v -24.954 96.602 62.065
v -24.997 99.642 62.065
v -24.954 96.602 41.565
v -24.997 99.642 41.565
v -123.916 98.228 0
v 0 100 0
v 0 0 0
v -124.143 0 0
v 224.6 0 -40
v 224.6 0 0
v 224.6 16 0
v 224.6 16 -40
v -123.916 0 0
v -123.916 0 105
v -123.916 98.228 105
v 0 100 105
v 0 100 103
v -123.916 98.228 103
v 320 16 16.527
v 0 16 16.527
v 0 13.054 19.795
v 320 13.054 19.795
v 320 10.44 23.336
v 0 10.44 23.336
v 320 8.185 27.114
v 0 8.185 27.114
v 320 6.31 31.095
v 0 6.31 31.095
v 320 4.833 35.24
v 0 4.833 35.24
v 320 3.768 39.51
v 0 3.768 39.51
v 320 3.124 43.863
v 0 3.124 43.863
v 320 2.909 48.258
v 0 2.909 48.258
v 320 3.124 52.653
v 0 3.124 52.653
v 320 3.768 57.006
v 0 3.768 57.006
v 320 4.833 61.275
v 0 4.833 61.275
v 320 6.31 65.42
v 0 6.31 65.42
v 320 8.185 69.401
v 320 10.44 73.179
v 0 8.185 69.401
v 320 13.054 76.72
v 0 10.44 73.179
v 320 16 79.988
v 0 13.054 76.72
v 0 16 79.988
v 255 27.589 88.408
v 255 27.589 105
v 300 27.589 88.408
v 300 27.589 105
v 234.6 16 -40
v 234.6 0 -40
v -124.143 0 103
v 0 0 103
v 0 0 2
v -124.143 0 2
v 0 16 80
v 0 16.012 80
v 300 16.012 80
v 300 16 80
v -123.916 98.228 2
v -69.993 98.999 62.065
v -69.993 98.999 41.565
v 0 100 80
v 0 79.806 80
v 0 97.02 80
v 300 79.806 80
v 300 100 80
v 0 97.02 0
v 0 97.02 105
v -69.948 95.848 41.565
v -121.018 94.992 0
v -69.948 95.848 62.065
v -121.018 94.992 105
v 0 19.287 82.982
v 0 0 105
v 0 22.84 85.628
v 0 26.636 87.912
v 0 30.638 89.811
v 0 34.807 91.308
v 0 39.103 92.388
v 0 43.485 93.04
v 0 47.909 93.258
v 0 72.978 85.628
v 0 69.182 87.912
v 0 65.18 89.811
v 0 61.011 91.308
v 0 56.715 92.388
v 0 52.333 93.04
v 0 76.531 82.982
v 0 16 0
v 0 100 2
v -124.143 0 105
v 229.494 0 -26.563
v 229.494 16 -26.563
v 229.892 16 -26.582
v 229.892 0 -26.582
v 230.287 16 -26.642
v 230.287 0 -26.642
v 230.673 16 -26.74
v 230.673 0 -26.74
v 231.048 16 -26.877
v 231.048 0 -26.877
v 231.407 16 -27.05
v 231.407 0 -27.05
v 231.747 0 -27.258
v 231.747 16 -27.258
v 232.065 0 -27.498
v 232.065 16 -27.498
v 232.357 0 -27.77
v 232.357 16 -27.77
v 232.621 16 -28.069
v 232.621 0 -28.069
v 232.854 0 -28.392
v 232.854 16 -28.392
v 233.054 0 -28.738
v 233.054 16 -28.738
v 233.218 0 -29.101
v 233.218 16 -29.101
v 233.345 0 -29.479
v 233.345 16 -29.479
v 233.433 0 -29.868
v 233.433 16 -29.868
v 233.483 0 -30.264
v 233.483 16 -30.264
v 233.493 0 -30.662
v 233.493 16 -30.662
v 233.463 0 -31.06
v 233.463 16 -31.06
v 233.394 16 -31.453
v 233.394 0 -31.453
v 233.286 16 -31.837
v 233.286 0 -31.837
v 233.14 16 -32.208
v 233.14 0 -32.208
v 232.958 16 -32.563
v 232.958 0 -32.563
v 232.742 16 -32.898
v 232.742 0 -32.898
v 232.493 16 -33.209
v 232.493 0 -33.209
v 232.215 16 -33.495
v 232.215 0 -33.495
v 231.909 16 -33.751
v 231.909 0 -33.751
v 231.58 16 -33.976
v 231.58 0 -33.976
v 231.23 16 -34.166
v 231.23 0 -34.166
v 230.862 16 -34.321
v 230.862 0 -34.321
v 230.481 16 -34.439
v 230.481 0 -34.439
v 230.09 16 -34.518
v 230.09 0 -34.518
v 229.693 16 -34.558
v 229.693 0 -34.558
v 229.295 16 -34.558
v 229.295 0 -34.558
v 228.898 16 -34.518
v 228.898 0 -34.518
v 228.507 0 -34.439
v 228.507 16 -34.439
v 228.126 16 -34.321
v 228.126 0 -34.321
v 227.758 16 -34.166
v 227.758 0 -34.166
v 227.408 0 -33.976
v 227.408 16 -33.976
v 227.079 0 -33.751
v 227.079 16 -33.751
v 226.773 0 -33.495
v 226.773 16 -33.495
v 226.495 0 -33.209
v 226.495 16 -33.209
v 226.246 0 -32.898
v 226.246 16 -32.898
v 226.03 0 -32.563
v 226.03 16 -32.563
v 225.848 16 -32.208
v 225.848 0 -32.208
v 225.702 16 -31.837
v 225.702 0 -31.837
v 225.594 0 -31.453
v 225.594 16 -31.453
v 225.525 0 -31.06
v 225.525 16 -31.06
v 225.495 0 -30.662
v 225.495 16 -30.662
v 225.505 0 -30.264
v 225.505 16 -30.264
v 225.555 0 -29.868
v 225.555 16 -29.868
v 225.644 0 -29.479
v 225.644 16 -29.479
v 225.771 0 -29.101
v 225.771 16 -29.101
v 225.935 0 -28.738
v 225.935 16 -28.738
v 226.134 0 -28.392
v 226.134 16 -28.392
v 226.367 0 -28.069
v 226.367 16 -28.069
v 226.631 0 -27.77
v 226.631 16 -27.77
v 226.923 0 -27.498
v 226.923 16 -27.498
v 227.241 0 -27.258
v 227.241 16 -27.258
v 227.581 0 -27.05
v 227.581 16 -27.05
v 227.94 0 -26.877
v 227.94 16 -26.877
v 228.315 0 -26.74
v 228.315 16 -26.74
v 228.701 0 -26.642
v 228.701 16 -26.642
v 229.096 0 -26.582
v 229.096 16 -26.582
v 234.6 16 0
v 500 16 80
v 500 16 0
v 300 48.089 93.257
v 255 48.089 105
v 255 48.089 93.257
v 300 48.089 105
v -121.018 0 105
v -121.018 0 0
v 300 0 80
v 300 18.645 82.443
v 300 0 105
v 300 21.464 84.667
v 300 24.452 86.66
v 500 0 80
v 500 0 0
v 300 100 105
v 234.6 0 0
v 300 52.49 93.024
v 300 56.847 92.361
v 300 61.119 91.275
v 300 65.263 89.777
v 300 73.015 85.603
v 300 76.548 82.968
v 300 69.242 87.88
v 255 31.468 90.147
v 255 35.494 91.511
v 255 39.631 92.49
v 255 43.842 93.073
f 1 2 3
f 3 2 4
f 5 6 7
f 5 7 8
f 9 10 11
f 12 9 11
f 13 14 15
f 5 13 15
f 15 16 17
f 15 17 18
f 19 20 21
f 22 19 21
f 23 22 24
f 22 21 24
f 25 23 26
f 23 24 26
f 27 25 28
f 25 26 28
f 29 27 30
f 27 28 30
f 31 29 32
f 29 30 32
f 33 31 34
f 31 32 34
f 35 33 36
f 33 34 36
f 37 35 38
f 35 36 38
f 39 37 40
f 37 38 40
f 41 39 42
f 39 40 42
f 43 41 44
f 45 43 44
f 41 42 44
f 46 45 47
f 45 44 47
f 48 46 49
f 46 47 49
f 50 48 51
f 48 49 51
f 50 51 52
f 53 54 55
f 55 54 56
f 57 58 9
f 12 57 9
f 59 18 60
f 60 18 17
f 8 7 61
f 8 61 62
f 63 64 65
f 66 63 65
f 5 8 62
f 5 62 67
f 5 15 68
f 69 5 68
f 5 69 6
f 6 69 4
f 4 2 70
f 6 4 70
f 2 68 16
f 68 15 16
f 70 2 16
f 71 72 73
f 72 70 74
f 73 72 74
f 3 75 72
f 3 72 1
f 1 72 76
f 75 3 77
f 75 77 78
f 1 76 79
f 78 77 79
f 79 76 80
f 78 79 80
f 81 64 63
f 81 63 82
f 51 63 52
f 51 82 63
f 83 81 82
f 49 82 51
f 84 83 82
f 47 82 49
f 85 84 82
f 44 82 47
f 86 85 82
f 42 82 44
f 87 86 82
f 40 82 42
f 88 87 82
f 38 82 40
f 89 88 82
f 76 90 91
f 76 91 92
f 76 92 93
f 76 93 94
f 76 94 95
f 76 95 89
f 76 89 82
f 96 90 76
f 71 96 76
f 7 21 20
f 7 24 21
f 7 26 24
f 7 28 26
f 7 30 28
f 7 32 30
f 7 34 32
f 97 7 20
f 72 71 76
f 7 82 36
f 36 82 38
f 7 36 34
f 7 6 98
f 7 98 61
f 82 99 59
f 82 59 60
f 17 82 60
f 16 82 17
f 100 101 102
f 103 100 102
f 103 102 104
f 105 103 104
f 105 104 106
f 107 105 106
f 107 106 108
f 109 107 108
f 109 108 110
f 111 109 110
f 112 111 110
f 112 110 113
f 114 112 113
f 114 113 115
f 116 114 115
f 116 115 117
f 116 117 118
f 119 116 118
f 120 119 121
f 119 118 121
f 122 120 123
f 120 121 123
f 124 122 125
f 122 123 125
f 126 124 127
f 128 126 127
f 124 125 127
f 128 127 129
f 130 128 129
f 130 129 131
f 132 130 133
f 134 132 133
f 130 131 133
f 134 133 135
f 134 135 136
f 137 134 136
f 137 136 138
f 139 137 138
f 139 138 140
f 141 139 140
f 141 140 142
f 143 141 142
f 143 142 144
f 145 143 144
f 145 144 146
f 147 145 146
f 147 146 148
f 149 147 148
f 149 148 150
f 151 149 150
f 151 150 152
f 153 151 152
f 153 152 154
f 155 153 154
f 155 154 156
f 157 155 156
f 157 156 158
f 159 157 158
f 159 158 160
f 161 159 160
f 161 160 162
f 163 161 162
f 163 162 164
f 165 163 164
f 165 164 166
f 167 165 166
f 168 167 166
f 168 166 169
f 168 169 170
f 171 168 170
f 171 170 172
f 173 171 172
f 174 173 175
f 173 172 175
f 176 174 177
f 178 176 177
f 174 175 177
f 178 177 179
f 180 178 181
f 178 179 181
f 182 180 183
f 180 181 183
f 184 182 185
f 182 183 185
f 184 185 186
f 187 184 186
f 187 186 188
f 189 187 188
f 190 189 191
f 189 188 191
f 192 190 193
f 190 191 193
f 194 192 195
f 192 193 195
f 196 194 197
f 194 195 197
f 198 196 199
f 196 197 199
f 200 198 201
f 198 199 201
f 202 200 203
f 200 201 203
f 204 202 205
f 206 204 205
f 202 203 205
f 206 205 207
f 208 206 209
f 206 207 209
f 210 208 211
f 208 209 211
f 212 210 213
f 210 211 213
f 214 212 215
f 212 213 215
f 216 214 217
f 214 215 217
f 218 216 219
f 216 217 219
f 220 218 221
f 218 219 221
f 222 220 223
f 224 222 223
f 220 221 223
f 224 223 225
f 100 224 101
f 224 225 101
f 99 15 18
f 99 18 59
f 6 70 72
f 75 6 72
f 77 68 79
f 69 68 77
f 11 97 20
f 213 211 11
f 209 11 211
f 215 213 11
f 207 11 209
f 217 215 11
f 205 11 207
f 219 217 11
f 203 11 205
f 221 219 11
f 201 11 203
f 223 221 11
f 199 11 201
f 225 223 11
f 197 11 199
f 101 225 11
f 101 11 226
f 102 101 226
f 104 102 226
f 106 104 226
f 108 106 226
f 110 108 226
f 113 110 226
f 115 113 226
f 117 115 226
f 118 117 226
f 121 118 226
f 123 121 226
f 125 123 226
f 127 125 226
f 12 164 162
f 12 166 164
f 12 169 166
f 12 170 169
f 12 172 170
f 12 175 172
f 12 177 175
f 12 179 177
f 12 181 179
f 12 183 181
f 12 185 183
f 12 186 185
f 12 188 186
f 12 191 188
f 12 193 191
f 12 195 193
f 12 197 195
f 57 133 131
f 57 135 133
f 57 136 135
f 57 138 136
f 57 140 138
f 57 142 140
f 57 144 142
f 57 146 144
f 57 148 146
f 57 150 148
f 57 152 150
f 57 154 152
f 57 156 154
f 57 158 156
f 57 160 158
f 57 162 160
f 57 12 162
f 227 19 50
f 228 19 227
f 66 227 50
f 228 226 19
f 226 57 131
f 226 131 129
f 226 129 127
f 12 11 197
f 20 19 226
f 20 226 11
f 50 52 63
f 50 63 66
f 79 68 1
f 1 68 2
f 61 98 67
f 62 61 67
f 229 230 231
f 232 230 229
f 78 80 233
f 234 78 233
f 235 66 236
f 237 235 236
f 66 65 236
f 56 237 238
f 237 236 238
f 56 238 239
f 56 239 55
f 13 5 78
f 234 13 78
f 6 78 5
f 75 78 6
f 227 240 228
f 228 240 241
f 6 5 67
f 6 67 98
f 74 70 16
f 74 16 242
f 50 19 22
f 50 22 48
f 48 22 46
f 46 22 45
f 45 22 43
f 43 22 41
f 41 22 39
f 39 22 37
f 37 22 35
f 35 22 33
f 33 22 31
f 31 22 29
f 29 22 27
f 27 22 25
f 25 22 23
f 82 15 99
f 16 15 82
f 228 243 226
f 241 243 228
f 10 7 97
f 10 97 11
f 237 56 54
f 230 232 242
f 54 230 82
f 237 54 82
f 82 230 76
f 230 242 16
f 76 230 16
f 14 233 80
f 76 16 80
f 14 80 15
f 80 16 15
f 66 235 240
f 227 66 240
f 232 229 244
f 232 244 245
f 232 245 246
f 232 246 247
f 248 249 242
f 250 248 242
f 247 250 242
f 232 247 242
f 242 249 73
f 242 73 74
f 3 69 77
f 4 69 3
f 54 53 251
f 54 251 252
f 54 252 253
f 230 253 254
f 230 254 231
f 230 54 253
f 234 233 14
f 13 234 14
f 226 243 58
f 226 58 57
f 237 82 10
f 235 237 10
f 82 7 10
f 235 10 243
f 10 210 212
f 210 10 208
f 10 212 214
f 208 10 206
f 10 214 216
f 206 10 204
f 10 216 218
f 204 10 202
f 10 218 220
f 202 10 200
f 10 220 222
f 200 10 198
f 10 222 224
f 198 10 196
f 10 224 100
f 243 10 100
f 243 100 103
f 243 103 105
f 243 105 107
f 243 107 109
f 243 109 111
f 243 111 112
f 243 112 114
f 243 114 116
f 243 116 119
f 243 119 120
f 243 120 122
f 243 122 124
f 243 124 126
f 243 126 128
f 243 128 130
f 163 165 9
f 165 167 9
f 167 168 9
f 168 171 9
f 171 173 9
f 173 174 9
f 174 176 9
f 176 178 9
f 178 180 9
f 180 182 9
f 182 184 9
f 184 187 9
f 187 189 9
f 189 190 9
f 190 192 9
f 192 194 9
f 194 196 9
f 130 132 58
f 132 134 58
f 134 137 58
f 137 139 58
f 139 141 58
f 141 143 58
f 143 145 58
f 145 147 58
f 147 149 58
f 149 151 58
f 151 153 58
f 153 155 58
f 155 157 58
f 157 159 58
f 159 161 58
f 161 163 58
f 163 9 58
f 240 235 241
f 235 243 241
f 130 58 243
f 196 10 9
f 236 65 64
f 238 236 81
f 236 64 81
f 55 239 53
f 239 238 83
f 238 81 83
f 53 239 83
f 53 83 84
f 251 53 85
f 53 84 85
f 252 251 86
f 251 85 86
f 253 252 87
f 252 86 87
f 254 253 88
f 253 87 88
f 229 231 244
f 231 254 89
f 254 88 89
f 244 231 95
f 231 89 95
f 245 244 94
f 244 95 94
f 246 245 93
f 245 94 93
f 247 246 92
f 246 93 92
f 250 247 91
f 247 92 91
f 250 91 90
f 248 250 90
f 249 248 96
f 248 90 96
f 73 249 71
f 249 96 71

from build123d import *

# Parameters (mm, degrees)
SKETCH1_W            = 500
SKETCH1_H            = 80
BOSS_EXTRUDE1_DEPTH  = 16
SKETCH9_W            = 300
SKETCH9_H            = 100
BOSS_EXTRUDE5_DEPTH  = 25
SKETCH12_R           = 45
CUT_EXTRUDE4_DEPTH   = 320
SKETCH13_W           = 45
SKETCH13_H           = 20.5
CUT_EXTRUDE5_DEPTH   = 40
SKETCH14_W           = 10
SKETCH14_H           = 16
BOSS_EXTRUDE6_DEPTH  = 40
SKETCH15_R           = 4
CUT_EXTRUDE6_DEPTH   = 40
BOSS_EXTRUDE7_REACH  = 532.118
BOSS_EXTRUDE8_DEPTH  = 2
BOSS_EXTRUDE10_DEPTH = 2
SKETCH22_W           = 45
SKETCH22_H           = 20.5
CUT_EXTRUDE9_DEPTH   = 152


with BuildPart() as part:
    # Sketch1 → Boss-Extrude1 (new body)
    with BuildSketch(Plane(origin=(0, 0, 0), x_dir=(1, 0, 0), z_dir=(0, 1, 0))):
        with Locations((250, -40)):
            Rectangle(SKETCH1_W, SKETCH1_H)
    extrude(amount=BOSS_EXTRUDE1_DEPTH)

    # Sketch9 → Boss-Extrude5 (add)
    with BuildSketch(Plane.XY.offset(80)):
        with Locations((150, 50)):
            Rectangle(SKETCH9_W, SKETCH9_H)
    extrude(amount=BOSS_EXTRUDE5_DEPTH)

    # Sketch12 → Cut-Extrude4 (cut)
    with BuildSketch(Plane.ZY):
        with Locations((48.257619972, 47.909037796)):
            Circle(SKETCH12_R)
    extrude(amount=-CUT_EXTRUDE4_DEPTH, mode=Mode.SUBTRACT)

    # Sketch13 → Cut-Extrude5 (cut)
    with BuildSketch(Plane.XY.offset(105)):
        with Locations((277.5, 37.838827437)):
            Rectangle(SKETCH13_W, SKETCH13_H)
    extrude(amount=-CUT_EXTRUDE5_DEPTH, mode=Mode.SUBTRACT)

    # Sketch14 → Boss-Extrude6 (add)
    with BuildSketch(Plane(origin=(0, 0, 0), x_dir=(-1, 0, 0), z_dir=(0, 0, -1))):
        with Locations((-229.6, 8)):
            Rectangle(SKETCH14_W, SKETCH14_H)
    extrude(amount=BOSS_EXTRUDE6_DEPTH)

    # Sketch15 → Cut-Extrude6 (cut)
    with BuildSketch(Plane(origin=(0, 16, 0), x_dir=(1, 0, 0), z_dir=(0, 1, 0))):
        with Locations(Location((229.494020101, 30.562557787, 0), (0, 0, 270))):
            Circle(SKETCH15_R)
    extrude(amount=-CUT_EXTRUDE6_DEPTH, mode=Mode.SUBTRACT)

    # Boss-Extrude7: up to this face of the body (flat: up to its plane)
    boss_extrude7_end = Plane(part.part.faces().sort_by_distance((112.3, 8, 0))[0])
    # Sketch16 → Boss-Extrude7 (add, up to the picked face)
    with BuildSketch(Plane.XY.offset(105), mode=Mode.PRIVATE) as boss_extrude7_sk1:
        Polygon((0, 100), (0, 97.020005021), (-121.017630719, 94.99244459), (-121.017630719, 0), (-123.915883819, 0), (-123.915883819, 98.227782534), align=None)
    boss_extrude7_tool1 = split(extrude(boss_extrude7_sk1.sketch, amount=-BOSS_EXTRUDE7_REACH, mode=Mode.PRIVATE), bisect_by=boss_extrude7_end, keep=Keep.BOTH, mode=Mode.PRIVATE)
    add(boss_extrude7_tool1.solids().sort_by(Axis((-1.59233, 98.510003, 105), (0, 0, -1)))[0])

    # Sketch22 → Cut-Extrude9 (cut)
    with BuildSketch(Plane(origin=(-1.429885334, 99.979550097, 0), x_dir=(0.9998977452585963, 0.014300315618031738, 0), z_dir=(-0.014300315618031738, 0.9998977452585963, 0))):
        with Locations((-46.069968438, -51.81530803)):
            Rectangle(SKETCH22_W, SKETCH22_H)
    extrude(amount=-CUT_EXTRUDE9_DEPTH, mode=Mode.SUBTRACT)


with BuildPart() as body_2:
    # Sketch17 → Boss-Extrude8 (new body)
    with BuildSketch(Plane.XY.offset(105)):
        Polygon((-124.14317248, 0), (0, 0), (0, 100), (-123.915883819, 98.227782534), align=None)
    extrude(amount=-BOSS_EXTRUDE8_DEPTH)


with BuildPart() as body_3:
    # Sketch19 → Boss-Extrude10 (new body)
    with BuildSketch(Plane(origin=(0, 0, 0), x_dir=(-1, 0, 0), z_dir=(0, 0, -1))):
        Polygon((0, 100), (0, 0), (124.14317248, 0), (123.915883819, 98.227782534), align=None)
    extrude(amount=-BOSS_EXTRUDE10_DEPTH)


solid = Compound([part.part, body_2.part, body_3.part])
